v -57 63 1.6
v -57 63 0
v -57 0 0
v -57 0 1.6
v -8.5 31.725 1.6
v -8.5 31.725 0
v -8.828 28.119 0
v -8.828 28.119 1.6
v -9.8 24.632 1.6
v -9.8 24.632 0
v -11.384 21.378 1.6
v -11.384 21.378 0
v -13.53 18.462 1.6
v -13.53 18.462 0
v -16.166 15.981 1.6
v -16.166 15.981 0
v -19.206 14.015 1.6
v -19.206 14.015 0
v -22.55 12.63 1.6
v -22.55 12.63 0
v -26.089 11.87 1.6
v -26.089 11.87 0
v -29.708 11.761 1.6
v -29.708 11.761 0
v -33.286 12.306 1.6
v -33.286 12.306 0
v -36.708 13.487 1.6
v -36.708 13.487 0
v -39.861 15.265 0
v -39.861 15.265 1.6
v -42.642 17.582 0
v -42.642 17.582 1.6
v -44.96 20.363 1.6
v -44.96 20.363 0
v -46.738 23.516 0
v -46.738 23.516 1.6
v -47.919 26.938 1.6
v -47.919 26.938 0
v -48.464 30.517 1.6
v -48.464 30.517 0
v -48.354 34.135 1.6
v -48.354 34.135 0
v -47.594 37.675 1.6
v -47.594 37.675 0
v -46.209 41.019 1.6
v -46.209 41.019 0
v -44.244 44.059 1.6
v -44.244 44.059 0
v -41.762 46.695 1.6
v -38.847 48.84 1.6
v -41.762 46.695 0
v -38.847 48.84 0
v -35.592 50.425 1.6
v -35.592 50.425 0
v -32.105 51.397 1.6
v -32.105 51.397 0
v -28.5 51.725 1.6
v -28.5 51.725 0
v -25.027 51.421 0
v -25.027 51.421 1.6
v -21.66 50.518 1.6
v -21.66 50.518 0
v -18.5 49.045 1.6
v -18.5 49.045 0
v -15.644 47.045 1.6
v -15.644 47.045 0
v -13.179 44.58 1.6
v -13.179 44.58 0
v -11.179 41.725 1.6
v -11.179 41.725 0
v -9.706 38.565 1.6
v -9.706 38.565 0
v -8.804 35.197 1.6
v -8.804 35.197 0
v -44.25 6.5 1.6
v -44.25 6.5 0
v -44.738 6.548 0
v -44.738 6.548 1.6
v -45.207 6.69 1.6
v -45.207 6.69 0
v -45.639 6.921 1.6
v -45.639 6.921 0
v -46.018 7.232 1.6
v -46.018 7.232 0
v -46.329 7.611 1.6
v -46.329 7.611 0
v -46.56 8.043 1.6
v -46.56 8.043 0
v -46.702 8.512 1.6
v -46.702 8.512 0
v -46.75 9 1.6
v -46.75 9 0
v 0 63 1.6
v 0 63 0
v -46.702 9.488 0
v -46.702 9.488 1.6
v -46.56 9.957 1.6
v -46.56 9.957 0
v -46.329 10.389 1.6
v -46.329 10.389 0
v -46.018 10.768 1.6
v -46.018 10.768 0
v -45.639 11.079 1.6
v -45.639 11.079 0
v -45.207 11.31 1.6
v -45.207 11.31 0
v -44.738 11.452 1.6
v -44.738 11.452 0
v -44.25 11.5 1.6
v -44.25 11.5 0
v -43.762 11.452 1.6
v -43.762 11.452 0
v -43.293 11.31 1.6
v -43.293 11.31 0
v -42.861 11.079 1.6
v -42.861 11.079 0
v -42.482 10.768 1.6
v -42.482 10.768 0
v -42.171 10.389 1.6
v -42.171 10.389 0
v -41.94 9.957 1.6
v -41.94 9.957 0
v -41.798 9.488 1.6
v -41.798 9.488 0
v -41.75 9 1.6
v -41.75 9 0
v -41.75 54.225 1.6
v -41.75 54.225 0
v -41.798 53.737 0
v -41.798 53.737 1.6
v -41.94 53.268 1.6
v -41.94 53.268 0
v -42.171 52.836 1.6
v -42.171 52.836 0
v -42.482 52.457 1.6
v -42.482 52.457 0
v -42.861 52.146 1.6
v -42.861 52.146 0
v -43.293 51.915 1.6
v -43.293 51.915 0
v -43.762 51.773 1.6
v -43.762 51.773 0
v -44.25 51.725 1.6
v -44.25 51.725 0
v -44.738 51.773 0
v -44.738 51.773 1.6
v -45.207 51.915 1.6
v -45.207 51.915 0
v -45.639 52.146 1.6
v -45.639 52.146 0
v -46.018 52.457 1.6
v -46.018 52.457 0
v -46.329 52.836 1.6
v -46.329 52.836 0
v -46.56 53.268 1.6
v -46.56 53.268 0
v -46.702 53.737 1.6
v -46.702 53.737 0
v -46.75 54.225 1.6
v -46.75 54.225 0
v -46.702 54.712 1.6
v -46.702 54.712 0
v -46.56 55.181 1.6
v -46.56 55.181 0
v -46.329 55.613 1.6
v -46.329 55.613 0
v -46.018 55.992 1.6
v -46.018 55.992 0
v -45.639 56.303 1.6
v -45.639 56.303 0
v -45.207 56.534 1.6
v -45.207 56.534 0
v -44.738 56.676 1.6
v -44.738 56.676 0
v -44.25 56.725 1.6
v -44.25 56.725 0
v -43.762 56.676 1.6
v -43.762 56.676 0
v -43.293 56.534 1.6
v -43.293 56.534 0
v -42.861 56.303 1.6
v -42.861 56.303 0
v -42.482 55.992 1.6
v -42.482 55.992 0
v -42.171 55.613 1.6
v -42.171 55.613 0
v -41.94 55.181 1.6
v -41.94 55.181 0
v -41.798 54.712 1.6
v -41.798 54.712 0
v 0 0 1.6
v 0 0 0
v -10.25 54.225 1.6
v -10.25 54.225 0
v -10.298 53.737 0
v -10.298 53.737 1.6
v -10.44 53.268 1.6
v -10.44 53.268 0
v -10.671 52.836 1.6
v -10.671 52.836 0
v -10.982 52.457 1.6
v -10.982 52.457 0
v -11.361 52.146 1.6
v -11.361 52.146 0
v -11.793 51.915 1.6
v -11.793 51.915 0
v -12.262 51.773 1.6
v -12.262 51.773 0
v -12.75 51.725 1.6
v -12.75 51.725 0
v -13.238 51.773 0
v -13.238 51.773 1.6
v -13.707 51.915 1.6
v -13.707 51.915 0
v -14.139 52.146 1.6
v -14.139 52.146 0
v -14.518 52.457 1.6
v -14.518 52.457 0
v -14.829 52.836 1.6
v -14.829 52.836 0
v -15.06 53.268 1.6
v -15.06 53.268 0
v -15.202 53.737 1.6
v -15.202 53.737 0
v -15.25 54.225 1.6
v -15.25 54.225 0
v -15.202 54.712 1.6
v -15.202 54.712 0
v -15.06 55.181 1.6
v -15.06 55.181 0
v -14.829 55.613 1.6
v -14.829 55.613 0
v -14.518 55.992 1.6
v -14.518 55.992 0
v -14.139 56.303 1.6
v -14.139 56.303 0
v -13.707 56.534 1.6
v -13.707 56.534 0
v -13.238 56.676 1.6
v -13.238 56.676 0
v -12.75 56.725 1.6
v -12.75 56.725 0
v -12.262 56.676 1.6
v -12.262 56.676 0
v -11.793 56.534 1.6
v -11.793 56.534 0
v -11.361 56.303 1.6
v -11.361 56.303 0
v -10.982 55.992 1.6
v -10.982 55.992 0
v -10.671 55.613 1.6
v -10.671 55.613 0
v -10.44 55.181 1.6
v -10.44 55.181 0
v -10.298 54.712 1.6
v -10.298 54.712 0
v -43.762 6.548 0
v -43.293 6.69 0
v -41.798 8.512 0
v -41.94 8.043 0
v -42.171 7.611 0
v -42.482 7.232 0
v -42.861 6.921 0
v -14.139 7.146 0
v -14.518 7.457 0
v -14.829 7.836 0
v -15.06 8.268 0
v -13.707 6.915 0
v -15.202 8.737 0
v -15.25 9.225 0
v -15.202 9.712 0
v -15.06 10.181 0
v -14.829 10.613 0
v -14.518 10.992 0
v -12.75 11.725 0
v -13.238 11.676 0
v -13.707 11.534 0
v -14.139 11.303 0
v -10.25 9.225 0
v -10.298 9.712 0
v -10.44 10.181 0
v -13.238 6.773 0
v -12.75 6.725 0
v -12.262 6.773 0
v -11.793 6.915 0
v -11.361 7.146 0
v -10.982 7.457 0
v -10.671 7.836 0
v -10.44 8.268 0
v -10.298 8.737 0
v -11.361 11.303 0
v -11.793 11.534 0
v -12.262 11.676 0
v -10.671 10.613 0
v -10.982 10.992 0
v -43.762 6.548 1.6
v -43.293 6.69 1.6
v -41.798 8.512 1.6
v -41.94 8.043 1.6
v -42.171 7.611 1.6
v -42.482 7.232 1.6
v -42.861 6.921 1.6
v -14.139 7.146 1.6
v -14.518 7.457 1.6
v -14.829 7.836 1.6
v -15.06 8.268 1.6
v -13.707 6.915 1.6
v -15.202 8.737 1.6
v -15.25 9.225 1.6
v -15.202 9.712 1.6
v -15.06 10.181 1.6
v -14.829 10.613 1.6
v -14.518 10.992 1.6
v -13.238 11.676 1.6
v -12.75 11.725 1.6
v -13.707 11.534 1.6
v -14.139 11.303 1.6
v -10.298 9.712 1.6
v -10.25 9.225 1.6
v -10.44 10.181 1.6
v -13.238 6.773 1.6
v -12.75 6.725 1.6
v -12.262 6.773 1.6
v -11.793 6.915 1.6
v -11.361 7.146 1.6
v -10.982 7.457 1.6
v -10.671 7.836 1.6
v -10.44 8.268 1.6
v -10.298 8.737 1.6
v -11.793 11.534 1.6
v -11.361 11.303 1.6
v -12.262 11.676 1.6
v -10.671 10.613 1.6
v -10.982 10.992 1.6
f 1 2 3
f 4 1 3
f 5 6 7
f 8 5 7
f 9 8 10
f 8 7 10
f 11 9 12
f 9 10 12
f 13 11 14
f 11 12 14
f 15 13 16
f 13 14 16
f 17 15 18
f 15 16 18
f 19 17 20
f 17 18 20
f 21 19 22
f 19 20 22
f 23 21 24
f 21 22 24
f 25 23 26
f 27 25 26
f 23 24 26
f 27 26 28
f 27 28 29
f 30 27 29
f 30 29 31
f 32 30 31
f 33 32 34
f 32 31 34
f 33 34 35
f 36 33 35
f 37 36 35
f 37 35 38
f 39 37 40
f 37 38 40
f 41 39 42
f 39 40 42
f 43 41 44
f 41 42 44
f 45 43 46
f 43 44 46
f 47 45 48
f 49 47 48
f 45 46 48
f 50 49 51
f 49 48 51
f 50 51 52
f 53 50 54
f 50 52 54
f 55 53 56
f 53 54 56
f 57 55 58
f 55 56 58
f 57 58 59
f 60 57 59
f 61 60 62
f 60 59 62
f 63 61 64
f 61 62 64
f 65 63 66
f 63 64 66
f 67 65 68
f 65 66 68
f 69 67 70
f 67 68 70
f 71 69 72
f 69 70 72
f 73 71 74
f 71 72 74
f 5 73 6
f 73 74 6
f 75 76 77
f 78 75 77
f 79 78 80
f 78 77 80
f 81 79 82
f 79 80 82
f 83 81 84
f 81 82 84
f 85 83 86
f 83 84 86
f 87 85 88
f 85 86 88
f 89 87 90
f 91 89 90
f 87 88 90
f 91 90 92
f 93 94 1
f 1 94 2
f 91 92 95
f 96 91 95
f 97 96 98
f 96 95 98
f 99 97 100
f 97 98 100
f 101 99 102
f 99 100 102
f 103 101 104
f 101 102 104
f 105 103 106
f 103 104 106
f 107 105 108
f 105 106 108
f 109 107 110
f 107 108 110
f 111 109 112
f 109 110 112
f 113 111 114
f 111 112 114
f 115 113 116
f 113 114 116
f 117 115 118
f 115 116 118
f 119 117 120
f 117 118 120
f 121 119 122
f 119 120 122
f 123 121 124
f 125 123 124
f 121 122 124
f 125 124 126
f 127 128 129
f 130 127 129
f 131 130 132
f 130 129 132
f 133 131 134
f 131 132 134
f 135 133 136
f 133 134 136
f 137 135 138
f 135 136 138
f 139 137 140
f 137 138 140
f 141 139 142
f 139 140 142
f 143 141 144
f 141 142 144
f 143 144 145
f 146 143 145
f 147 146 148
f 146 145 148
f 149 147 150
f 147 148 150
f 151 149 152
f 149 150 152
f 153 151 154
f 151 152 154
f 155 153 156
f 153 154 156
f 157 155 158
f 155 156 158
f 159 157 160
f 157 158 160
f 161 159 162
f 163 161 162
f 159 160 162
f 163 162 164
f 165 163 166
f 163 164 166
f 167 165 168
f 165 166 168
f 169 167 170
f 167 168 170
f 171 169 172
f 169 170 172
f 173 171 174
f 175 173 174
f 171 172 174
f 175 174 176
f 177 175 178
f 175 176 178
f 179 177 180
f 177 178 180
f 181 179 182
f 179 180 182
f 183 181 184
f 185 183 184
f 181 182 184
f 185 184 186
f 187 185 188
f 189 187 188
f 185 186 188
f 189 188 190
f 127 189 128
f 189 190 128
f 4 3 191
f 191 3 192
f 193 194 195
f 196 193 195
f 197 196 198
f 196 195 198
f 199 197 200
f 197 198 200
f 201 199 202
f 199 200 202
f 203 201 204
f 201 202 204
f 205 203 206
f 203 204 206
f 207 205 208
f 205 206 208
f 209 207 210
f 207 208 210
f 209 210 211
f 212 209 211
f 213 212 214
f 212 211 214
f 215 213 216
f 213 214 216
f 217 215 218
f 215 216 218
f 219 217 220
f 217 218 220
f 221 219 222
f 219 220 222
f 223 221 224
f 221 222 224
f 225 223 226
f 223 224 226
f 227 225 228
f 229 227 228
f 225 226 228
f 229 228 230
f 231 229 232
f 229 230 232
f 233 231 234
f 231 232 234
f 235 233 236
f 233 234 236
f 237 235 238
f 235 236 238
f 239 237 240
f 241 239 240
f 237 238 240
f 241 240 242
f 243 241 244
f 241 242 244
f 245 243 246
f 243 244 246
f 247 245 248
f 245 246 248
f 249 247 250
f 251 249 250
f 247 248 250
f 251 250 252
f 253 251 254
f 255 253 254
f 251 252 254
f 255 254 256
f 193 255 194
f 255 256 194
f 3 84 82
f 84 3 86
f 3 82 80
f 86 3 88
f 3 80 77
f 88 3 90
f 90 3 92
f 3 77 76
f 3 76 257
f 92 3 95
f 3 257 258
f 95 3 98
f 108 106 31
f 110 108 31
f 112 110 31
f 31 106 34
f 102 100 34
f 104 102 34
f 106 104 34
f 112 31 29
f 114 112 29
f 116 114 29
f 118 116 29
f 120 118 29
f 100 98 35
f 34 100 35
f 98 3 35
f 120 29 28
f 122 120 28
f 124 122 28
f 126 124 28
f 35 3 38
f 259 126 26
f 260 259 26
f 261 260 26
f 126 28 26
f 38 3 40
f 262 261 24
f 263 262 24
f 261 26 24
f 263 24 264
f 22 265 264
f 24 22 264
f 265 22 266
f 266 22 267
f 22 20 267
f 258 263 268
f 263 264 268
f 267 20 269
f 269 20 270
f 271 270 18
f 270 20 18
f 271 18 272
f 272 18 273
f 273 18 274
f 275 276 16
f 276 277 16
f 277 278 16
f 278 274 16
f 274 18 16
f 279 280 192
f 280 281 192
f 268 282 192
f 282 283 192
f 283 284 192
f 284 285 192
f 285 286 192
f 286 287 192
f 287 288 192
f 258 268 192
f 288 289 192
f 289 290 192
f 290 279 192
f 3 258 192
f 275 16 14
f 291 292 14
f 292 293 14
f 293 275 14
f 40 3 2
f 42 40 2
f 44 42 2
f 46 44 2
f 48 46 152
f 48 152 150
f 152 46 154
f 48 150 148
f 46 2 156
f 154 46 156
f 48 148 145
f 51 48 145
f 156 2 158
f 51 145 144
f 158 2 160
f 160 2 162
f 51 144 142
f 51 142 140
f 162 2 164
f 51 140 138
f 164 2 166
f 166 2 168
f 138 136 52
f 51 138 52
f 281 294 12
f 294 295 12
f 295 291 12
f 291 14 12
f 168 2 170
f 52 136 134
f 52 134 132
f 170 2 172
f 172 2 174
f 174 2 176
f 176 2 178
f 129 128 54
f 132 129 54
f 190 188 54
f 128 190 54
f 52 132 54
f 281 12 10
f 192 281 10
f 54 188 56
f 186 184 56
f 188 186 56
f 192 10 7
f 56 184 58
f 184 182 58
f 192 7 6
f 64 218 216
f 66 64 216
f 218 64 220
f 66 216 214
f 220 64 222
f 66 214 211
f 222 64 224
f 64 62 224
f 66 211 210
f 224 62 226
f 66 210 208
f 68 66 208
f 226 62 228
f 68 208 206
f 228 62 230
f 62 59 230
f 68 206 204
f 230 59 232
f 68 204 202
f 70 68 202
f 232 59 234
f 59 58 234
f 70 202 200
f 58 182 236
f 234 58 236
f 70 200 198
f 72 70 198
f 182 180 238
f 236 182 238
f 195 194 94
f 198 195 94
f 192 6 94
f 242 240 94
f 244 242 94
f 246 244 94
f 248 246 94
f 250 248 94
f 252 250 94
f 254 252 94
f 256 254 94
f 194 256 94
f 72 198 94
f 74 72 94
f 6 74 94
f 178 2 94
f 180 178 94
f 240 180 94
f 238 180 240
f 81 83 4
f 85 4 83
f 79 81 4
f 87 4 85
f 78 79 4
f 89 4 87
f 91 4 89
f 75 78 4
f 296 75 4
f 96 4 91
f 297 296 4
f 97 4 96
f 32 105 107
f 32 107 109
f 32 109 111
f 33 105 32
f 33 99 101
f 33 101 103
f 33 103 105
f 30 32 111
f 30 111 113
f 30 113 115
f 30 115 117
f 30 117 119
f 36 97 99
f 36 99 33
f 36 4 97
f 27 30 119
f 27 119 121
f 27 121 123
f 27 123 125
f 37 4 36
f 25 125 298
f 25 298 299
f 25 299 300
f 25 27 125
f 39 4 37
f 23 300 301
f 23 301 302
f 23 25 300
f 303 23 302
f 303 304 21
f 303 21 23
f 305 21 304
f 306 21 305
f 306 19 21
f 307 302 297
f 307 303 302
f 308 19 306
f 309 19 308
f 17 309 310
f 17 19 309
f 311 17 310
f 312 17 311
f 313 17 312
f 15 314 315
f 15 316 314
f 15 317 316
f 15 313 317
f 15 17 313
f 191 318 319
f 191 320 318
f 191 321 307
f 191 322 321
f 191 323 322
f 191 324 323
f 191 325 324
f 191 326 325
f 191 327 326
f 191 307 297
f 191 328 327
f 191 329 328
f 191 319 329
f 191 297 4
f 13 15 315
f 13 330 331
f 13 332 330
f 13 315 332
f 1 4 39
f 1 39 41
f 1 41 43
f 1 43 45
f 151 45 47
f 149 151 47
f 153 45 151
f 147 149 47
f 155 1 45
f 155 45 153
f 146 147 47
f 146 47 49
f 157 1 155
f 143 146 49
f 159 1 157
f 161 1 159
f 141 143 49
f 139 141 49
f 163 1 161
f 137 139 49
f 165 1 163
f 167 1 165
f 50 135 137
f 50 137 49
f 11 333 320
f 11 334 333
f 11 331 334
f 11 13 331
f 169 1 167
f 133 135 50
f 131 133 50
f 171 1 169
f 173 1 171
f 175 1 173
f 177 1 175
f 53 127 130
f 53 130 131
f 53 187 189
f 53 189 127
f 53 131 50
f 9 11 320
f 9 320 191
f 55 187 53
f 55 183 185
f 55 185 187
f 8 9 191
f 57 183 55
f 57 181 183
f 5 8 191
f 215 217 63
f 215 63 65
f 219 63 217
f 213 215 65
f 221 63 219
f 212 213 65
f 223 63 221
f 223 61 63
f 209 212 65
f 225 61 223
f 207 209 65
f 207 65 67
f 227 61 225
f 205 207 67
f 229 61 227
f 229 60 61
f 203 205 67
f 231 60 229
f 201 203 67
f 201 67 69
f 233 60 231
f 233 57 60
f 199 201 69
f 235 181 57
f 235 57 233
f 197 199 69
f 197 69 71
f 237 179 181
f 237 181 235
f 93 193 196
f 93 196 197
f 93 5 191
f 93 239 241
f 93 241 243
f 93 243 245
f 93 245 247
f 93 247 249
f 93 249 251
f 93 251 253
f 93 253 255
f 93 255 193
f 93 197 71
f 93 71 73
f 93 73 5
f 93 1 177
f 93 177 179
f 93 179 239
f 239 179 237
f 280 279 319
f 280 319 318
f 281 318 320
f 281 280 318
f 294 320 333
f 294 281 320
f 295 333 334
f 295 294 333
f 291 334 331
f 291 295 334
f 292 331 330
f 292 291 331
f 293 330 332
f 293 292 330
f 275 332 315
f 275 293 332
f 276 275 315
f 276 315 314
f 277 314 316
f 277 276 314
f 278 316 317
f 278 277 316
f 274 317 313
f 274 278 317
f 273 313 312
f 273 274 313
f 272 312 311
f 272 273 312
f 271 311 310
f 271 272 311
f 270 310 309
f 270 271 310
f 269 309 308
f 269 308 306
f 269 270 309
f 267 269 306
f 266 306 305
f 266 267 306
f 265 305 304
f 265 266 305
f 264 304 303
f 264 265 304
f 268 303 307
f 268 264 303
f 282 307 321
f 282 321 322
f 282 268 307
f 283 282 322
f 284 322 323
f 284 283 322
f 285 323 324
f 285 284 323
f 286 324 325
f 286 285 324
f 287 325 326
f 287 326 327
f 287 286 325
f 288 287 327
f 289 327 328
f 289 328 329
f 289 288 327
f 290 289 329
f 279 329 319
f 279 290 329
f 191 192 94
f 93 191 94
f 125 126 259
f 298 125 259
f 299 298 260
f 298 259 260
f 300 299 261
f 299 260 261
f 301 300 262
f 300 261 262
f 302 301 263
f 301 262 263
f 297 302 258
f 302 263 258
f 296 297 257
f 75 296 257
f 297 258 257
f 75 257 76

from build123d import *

# Parameters (mm, degrees)
F0_R     = 2.5
F1_DEPTH = 1.6


with BuildPart() as f1:
    # F0 (on Top) → F1 (new body)
    with BuildSketch(Plane.XY):
        with BuildLine():
            Line((-44.25, 0), (0, 0))
            Line((0, 0), (0, 63))
            Line((0, 63), (-57, 63))
            Line((-57, 63), (-57, 9))
            Line((-57, 9), (-46.75, 9))
            ThreePointArc((-46.75, 9), (-44.25, 11.5), (-41.75, 9))
            ThreePointArc((-41.75, 9), (-42.482233047, 7.232233047), (-44.25, 6.5))
            Line((-44.25, 6.5), (-44.25, 0))
        make_face()
        with Locations((-12.75, 9.2245186158)):
            Circle(F0_R, mode=Mode.SUBTRACT)
        with BuildLine():
            ThreePointArc((-46.75, 54.2245186158), (-44.25, 56.7245186158), (-41.75, 54.2245186158))
            ThreePointArc((-41.75, 54.2245186158), (-44.25, 51.7245186158), (-46.75, 54.2245186158))
        make_face(mode=Mode.SUBTRACT)
        with BuildLine():
            ThreePointArc((-8.5, 31.7245186158), (-42.6421356237, 17.582382992), (-28.5, 51.7245186158))
            ThreePointArc((-28.5, 51.7245186158), (-14.3578643763, 45.8666542395), (-8.5, 31.7245186158))
        make_face(mode=Mode.SUBTRACT)
        with BuildLine():
            ThreePointArc((-15.25, 54.2245186158), (-12.75, 56.7245186158), (-10.25, 54.2245186158))
            ThreePointArc((-10.25, 54.2245186158), (-12.75, 51.7245186158), (-15.25, 54.2245186158))
        make_face(mode=Mode.SUBTRACT)
        with BuildLine():
            Line((-57, 0), (-44.25, 0))
            Line((-44.25, 0), (-44.25, 6.5))
            ThreePointArc((-44.25, 6.5), (-46.017766953, 7.232233047), (-46.75, 9))
            Line((-46.75, 9), (-57, 9))
            Line((-57, 9), (-57, 0))
        make_face()
    extrude(amount=F1_DEPTH)


solid = f1.part
